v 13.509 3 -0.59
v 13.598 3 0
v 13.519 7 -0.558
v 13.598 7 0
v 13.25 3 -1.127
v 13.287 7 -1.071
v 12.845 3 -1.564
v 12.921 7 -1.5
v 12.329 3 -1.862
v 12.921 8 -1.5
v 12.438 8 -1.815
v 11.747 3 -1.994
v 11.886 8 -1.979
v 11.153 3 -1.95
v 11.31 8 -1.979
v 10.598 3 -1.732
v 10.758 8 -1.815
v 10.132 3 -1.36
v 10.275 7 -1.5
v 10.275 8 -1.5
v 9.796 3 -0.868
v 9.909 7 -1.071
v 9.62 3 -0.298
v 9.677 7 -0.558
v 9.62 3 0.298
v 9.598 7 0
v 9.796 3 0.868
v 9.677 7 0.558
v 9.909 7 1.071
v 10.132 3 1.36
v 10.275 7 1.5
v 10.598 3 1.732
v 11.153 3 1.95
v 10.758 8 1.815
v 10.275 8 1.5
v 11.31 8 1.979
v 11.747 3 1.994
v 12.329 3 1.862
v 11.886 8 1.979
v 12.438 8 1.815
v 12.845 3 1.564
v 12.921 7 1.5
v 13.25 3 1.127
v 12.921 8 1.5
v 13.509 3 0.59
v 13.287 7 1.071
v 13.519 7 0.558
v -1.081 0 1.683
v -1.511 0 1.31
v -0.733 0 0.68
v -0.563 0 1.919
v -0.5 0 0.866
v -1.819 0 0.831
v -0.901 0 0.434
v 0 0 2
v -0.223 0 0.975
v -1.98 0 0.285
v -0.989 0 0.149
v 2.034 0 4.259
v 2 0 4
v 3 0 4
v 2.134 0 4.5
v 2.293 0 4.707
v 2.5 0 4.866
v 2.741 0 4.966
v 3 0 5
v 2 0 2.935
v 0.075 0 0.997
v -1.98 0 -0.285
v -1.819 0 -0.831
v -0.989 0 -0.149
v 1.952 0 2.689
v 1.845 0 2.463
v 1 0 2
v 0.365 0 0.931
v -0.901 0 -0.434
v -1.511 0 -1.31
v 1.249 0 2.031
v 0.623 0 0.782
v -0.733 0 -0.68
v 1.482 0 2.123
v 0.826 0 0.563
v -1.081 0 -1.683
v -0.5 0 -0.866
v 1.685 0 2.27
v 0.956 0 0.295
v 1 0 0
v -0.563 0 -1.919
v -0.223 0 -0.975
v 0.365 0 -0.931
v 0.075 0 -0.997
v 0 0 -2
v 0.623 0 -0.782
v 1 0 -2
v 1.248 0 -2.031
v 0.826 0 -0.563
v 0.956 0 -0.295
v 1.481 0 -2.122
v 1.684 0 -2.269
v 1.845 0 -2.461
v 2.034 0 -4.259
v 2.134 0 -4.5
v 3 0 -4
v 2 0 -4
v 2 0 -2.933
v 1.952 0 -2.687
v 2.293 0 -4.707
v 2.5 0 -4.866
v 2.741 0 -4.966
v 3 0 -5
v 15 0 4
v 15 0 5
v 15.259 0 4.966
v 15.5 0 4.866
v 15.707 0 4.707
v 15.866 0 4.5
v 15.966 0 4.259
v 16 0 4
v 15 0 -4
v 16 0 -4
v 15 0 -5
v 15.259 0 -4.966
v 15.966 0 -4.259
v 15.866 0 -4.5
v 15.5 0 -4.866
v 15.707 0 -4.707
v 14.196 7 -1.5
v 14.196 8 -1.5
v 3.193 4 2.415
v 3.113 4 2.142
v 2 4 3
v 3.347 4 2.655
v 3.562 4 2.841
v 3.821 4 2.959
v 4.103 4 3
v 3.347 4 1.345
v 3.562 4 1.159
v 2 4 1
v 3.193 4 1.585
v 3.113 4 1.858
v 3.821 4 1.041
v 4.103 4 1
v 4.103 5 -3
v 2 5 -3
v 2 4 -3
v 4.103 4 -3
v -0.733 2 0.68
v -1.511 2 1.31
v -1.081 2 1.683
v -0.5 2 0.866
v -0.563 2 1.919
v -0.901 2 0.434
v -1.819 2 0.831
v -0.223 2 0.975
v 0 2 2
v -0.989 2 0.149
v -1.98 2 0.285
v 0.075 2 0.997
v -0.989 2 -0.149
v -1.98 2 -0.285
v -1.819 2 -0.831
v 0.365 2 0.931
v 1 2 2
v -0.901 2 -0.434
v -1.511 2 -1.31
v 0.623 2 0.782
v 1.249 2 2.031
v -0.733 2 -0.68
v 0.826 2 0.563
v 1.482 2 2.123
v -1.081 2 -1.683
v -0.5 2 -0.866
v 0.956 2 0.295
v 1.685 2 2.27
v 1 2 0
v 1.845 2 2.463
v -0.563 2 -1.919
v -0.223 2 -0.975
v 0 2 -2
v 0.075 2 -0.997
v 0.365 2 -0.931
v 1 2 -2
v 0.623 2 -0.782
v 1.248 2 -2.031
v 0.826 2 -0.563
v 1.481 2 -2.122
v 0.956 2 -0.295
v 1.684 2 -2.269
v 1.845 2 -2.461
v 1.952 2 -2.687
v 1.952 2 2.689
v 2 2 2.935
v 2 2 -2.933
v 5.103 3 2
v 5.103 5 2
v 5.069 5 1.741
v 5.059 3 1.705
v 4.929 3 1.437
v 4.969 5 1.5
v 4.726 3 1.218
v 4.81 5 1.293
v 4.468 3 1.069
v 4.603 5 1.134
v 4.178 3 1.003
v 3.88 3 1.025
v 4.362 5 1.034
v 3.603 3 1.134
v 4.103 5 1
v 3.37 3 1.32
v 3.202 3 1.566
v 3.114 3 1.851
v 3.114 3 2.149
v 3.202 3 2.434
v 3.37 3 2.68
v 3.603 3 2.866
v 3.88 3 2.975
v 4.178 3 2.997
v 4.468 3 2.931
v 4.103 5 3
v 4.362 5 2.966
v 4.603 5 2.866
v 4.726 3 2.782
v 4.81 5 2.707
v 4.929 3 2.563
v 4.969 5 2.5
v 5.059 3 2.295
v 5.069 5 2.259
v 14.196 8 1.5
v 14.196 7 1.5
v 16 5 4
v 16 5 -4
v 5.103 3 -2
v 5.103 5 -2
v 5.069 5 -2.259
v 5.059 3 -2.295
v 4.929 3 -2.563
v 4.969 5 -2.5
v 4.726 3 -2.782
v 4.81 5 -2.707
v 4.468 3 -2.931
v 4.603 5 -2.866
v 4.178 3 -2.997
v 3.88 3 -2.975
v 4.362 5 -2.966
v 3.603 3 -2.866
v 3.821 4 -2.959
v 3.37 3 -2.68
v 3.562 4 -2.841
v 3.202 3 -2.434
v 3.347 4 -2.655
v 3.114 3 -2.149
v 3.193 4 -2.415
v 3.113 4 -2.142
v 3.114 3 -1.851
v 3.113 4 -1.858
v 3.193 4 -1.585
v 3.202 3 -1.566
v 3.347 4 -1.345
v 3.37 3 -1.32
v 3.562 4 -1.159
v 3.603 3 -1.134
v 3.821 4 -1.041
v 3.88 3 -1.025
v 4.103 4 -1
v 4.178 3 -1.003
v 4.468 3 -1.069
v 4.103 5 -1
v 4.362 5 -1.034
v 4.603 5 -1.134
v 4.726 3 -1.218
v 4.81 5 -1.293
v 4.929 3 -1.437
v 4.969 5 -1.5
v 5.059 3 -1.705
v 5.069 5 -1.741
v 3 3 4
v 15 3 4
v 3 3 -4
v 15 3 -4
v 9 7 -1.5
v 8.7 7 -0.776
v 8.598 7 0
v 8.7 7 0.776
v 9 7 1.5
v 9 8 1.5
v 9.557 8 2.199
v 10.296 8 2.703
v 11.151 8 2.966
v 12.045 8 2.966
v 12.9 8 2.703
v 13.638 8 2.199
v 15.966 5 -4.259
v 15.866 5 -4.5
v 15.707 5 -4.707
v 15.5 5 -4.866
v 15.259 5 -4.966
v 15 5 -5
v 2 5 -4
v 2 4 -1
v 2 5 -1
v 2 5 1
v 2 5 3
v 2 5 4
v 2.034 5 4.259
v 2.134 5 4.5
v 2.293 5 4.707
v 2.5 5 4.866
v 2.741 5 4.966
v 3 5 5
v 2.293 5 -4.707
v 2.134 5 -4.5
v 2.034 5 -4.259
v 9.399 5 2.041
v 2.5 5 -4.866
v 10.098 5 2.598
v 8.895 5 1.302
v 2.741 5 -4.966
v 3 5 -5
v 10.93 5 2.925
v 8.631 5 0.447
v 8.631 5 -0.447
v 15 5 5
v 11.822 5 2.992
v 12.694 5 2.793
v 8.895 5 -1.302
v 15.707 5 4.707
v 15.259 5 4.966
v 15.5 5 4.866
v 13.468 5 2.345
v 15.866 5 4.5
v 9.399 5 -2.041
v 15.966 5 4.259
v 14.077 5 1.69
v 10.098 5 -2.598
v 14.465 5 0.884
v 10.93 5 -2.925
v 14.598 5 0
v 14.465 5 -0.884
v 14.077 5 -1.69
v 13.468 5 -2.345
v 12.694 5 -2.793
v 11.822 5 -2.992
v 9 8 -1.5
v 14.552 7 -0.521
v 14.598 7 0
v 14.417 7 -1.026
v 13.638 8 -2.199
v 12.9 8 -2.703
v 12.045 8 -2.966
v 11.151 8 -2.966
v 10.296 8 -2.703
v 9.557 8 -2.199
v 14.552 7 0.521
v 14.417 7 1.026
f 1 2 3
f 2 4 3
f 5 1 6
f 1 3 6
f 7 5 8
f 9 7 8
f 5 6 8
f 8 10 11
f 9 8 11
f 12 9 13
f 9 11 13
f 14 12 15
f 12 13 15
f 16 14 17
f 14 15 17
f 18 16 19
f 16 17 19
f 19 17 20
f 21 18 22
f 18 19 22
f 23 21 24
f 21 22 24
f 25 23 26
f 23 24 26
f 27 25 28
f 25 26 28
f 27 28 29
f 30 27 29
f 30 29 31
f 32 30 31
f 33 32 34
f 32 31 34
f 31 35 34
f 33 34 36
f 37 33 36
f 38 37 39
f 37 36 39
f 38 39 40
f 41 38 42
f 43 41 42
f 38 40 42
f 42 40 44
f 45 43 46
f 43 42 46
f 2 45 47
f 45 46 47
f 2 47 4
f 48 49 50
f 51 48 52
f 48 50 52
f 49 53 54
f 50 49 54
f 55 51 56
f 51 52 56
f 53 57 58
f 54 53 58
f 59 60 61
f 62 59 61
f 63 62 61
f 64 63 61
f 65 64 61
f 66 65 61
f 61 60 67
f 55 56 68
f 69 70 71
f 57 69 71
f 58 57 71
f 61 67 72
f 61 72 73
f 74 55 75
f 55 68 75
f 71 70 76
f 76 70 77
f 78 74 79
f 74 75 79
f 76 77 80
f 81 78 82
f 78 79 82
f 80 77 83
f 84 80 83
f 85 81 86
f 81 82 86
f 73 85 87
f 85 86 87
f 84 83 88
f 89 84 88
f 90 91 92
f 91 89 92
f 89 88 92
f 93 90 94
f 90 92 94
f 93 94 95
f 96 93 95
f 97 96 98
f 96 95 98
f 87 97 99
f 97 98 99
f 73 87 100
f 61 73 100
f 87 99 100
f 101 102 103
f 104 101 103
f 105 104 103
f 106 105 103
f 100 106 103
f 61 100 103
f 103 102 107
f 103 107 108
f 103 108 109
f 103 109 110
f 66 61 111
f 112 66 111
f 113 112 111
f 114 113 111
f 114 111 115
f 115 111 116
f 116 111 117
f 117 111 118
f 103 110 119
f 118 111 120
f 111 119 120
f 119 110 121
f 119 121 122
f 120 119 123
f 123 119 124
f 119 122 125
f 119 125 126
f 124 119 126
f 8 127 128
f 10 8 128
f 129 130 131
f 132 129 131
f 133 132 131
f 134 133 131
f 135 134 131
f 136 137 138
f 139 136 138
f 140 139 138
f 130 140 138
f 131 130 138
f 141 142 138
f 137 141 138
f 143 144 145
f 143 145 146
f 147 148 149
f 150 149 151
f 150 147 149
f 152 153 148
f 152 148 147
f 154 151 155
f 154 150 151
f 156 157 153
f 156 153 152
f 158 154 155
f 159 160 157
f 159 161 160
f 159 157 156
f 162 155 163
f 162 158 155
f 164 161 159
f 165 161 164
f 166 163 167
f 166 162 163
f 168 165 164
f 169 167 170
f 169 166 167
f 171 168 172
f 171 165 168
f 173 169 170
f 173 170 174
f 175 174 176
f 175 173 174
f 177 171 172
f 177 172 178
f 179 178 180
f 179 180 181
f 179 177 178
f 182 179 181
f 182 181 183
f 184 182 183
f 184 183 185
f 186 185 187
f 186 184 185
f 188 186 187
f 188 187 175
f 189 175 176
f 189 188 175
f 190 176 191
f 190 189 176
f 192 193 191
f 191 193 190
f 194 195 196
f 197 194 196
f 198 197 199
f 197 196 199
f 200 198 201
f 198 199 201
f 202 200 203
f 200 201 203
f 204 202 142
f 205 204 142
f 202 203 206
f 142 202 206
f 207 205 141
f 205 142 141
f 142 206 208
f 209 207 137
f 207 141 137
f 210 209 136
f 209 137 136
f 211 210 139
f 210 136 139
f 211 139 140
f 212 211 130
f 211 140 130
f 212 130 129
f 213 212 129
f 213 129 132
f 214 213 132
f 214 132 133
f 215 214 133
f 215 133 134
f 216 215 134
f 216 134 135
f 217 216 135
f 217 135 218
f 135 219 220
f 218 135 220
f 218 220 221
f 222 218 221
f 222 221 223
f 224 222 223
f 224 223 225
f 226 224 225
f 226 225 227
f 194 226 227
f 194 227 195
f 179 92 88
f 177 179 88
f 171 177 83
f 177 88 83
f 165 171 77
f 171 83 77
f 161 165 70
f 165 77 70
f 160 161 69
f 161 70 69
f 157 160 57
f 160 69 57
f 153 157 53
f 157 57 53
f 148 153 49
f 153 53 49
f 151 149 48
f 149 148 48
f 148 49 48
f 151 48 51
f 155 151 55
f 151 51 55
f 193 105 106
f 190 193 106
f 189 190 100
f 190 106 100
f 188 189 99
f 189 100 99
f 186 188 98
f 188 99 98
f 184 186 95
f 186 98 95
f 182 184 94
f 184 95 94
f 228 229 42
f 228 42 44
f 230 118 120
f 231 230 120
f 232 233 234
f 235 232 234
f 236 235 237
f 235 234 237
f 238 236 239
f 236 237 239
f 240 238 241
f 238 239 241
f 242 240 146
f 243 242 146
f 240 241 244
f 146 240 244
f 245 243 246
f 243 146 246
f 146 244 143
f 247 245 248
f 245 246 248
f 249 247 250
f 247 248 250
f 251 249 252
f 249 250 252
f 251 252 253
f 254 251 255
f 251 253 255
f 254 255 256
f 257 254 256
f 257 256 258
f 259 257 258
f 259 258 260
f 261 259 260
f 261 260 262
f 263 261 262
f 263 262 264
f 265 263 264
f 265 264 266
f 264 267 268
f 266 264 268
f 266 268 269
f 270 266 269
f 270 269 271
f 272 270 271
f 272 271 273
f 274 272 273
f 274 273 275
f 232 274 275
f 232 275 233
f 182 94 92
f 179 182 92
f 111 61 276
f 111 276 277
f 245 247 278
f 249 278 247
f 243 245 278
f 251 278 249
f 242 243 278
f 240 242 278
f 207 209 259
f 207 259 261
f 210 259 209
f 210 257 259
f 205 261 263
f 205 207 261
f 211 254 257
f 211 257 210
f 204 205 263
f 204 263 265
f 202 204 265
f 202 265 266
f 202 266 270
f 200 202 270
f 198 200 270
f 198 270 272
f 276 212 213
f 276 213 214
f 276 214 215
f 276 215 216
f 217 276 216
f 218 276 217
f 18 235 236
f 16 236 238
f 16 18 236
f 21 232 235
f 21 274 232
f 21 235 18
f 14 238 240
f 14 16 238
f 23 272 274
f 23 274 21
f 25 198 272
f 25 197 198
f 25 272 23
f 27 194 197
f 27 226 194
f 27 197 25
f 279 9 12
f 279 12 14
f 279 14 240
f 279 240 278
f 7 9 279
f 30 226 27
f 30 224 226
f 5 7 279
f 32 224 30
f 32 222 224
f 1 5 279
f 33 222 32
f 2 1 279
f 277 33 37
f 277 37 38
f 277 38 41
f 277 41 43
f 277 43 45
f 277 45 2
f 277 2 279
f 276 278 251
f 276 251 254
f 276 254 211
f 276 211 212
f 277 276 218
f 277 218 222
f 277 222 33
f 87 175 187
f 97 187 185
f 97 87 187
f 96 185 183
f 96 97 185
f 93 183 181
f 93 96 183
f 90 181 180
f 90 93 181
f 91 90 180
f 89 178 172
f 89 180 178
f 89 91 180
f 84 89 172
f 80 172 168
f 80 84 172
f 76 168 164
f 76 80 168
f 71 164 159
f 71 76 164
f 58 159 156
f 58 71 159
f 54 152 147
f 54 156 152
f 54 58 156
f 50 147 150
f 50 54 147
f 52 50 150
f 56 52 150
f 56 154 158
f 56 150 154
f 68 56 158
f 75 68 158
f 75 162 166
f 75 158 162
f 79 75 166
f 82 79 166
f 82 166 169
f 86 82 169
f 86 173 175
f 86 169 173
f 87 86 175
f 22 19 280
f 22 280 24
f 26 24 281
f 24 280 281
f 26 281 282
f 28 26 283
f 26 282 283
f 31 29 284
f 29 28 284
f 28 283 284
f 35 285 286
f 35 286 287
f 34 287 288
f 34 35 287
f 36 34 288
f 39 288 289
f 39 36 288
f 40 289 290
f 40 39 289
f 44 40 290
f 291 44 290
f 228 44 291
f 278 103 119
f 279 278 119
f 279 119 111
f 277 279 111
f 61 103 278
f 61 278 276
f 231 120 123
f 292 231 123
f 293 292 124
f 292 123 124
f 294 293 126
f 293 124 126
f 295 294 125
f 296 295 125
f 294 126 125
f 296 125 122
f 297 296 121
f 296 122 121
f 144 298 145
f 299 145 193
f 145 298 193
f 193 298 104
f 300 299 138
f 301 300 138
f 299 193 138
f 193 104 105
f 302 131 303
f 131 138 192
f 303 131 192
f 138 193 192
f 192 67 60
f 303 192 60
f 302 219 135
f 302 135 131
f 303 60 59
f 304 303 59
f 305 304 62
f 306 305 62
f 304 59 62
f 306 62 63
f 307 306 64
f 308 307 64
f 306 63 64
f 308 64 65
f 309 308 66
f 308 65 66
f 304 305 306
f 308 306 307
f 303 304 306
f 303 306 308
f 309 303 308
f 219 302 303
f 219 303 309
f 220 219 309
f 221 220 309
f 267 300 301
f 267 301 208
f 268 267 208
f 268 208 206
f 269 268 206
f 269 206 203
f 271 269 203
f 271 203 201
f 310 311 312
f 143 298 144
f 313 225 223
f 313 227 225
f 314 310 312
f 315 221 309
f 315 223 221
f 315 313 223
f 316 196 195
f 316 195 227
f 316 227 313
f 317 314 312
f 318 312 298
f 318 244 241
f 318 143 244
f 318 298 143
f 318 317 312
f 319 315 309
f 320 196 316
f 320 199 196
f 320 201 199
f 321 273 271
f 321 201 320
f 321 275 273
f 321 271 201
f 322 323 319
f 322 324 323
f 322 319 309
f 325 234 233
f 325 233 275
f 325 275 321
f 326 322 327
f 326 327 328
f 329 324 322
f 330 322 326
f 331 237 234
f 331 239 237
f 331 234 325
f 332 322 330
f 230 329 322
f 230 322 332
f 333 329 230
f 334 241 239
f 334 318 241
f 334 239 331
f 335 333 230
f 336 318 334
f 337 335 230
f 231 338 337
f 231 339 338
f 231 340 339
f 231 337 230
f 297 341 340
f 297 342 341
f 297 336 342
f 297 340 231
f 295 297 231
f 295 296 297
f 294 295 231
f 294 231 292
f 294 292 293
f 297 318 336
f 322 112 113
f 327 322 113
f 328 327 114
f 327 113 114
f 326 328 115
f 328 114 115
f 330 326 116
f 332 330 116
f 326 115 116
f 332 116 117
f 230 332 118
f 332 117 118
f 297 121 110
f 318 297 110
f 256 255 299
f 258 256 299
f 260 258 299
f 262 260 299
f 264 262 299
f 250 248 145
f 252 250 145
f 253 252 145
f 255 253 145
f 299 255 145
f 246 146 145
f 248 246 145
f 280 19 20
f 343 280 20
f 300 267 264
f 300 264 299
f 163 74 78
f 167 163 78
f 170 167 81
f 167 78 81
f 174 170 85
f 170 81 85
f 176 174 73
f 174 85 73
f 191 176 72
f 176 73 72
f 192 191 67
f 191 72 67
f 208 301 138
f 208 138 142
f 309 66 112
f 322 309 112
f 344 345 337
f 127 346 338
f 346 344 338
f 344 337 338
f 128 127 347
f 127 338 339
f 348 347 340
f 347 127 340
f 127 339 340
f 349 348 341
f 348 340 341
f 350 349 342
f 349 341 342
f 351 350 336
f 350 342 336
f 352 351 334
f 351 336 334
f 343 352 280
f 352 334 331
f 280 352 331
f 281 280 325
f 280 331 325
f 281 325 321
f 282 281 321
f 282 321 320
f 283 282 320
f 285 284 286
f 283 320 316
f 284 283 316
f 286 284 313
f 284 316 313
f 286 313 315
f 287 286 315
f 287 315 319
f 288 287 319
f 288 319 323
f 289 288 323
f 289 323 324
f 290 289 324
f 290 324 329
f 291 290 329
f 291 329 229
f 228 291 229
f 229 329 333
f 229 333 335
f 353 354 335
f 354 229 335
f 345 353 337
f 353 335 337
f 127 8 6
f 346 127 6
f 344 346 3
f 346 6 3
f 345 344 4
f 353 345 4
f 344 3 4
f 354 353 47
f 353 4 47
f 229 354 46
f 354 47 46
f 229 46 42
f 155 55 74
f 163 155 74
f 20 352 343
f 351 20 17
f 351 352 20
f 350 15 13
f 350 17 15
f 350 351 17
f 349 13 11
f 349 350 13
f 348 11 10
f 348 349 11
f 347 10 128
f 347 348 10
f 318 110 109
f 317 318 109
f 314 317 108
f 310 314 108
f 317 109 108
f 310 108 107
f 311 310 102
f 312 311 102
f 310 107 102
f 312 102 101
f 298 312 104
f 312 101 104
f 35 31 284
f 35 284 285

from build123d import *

# Parameters (mm, degrees)
SKETCH1_R           = 1
BOSS_EXTRUDE1_DEPTH = 5
SKETCH3_W           = 12
SKETCH3_H           = 8
CUT_EXTRUDE1_DEPTH  = 3
SKETCH4_R           = 3
SKETCH4_R_2         = 2
BOSS_EXTRUDE2_DEPTH = 3
SKETCH5_W           = 3
SKETCH5_H           = 1
CUT_EXTRUDE2_DEPTH  = 17
SKETCH6_R           = 2
SKETCH6_R_2         = 1
SKETCH6_W           = 7.064198251
SKETCH6_H           = 8.717344461
CUT_EXTRUDE3_DEPTH  = 6
CUT_EXTRUDE4_DEPTH  = 1


with BuildPart() as part:
    # Sketch1 → Boss-Extrude1 (new body)
    with BuildSketch(Plane(origin=(0, 0, 0), x_dir=(1, 0, 0), z_dir=(0, 1, 0))):
        with BuildLine():
            Line((1, 2), (0, 2))
            ThreePointArc((0, 2), (-2, 0), (0, -2))
            Line((0, -2), (1, -2))
            ThreePointArc((1, -2), (1.684527719, -2.270177533), (2, -2.935046948))
            Line((2, -2.935046948), (2, -4))
            ThreePointArc((2, -4), (2.292893219, -4.707106781), (3, -5))
            Line((3, -5), (15, -5))
            ThreePointArc((15, -5), (15.707106781, -4.707106781), (16, -4))
            Line((16, -4), (16, 4))
            ThreePointArc((16, 4), (15.707106781, 4.707106781), (15, 5))
            Line((15, 5), (3, 5))
            ThreePointArc((3, 5), (2.292893219, 4.707106781), (2, 4))
            Line((2, 4), (2, 2.932864189))
            ThreePointArc((2, 2.932864189), (1.684390871, 2.268771092), (1, 2))
        make_face()
        Circle(SKETCH1_R, mode=Mode.SUBTRACT)
    extrude(amount=BOSS_EXTRUDE1_DEPTH)

    # Sketch3 → Cut-Extrude1 (cut)
    with BuildSketch(Plane.XZ):
        with Locations((9, 0)):
            Rectangle(SKETCH3_W, SKETCH3_H)
    extrude(amount=-CUT_EXTRUDE1_DEPTH, mode=Mode.SUBTRACT)

    # Sketch4 → Boss-Extrude2 (add)
    with BuildSketch(Plane(origin=(0, 5, 0), x_dir=(1, 0, 0), z_dir=(0, 1, 0))):
        with Locations((11.597924937, 0)):
            Circle(SKETCH4_R)
        with Locations((11.597924937, 0)):
            Circle(SKETCH4_R_2, mode=Mode.SUBTRACT)
    extrude(amount=BOSS_EXTRUDE2_DEPTH)

    # Sketch5 → Cut-Extrude2 (cut)
    with BuildSketch(Plane.ZY.offset(-2)):
        with Locations((0, 7.5)):
            Rectangle(SKETCH5_W, SKETCH5_H)
    extrude(amount=-CUT_EXTRUDE2_DEPTH, mode=Mode.SUBTRACT)

    # Sketch6 → Cut-Extrude3 (cut)
    with BuildSketch(Plane(origin=(0, 8, 0), x_dir=(1, 0, 0), z_dir=(0, 1, 0))):
        with Locations((11.597924937, 0)):
            Circle(SKETCH6_R)
        with Locations((4.102933475, -2)):
            Circle(SKETCH6_R_2)
        with Locations((4.102933475, 2)):
            Circle(SKETCH6_R_2)
        with Locations((-1.532099126, -1.425808042)):
            Rectangle(SKETCH6_W, SKETCH6_H)
    extrude(amount=-CUT_EXTRUDE3_DEPTH, mode=Mode.SUBTRACT)

    # Sketch7 → Cut-Extrude4 (cut)
    with BuildSketch(Plane(origin=(0, 5, 0), x_dir=(1, 0, 0), z_dir=(0, 1, 0))):
        with BuildLine():
            Line((4.102933475, -3), (0.252638608, -3))
            ThreePointArc((0.252638608, -3), (-0.747361392, -2), (0.252638608, -1))
            Line((0.252638608, -1), (4.102933475, -1))
            ThreePointArc((4.102933475, -1), (5.102933475, -2), (4.102933475, -3))
        make_face()
        with BuildLine():
            Line((4.102933475, 1), (0.944196424, 1))
            ThreePointArc((0.944196424, 1), (-0.055803576, 2), (0.944196424, 3))
            Line((0.944196424, 3), (4.102933475, 3))
            ThreePointArc((4.102933475, 3), (5.102933475, 2), (4.102933475, 1))
        make_face()
    extrude(amount=-CUT_EXTRUDE4_DEPTH, mode=Mode.SUBTRACT)


solid = part.part
